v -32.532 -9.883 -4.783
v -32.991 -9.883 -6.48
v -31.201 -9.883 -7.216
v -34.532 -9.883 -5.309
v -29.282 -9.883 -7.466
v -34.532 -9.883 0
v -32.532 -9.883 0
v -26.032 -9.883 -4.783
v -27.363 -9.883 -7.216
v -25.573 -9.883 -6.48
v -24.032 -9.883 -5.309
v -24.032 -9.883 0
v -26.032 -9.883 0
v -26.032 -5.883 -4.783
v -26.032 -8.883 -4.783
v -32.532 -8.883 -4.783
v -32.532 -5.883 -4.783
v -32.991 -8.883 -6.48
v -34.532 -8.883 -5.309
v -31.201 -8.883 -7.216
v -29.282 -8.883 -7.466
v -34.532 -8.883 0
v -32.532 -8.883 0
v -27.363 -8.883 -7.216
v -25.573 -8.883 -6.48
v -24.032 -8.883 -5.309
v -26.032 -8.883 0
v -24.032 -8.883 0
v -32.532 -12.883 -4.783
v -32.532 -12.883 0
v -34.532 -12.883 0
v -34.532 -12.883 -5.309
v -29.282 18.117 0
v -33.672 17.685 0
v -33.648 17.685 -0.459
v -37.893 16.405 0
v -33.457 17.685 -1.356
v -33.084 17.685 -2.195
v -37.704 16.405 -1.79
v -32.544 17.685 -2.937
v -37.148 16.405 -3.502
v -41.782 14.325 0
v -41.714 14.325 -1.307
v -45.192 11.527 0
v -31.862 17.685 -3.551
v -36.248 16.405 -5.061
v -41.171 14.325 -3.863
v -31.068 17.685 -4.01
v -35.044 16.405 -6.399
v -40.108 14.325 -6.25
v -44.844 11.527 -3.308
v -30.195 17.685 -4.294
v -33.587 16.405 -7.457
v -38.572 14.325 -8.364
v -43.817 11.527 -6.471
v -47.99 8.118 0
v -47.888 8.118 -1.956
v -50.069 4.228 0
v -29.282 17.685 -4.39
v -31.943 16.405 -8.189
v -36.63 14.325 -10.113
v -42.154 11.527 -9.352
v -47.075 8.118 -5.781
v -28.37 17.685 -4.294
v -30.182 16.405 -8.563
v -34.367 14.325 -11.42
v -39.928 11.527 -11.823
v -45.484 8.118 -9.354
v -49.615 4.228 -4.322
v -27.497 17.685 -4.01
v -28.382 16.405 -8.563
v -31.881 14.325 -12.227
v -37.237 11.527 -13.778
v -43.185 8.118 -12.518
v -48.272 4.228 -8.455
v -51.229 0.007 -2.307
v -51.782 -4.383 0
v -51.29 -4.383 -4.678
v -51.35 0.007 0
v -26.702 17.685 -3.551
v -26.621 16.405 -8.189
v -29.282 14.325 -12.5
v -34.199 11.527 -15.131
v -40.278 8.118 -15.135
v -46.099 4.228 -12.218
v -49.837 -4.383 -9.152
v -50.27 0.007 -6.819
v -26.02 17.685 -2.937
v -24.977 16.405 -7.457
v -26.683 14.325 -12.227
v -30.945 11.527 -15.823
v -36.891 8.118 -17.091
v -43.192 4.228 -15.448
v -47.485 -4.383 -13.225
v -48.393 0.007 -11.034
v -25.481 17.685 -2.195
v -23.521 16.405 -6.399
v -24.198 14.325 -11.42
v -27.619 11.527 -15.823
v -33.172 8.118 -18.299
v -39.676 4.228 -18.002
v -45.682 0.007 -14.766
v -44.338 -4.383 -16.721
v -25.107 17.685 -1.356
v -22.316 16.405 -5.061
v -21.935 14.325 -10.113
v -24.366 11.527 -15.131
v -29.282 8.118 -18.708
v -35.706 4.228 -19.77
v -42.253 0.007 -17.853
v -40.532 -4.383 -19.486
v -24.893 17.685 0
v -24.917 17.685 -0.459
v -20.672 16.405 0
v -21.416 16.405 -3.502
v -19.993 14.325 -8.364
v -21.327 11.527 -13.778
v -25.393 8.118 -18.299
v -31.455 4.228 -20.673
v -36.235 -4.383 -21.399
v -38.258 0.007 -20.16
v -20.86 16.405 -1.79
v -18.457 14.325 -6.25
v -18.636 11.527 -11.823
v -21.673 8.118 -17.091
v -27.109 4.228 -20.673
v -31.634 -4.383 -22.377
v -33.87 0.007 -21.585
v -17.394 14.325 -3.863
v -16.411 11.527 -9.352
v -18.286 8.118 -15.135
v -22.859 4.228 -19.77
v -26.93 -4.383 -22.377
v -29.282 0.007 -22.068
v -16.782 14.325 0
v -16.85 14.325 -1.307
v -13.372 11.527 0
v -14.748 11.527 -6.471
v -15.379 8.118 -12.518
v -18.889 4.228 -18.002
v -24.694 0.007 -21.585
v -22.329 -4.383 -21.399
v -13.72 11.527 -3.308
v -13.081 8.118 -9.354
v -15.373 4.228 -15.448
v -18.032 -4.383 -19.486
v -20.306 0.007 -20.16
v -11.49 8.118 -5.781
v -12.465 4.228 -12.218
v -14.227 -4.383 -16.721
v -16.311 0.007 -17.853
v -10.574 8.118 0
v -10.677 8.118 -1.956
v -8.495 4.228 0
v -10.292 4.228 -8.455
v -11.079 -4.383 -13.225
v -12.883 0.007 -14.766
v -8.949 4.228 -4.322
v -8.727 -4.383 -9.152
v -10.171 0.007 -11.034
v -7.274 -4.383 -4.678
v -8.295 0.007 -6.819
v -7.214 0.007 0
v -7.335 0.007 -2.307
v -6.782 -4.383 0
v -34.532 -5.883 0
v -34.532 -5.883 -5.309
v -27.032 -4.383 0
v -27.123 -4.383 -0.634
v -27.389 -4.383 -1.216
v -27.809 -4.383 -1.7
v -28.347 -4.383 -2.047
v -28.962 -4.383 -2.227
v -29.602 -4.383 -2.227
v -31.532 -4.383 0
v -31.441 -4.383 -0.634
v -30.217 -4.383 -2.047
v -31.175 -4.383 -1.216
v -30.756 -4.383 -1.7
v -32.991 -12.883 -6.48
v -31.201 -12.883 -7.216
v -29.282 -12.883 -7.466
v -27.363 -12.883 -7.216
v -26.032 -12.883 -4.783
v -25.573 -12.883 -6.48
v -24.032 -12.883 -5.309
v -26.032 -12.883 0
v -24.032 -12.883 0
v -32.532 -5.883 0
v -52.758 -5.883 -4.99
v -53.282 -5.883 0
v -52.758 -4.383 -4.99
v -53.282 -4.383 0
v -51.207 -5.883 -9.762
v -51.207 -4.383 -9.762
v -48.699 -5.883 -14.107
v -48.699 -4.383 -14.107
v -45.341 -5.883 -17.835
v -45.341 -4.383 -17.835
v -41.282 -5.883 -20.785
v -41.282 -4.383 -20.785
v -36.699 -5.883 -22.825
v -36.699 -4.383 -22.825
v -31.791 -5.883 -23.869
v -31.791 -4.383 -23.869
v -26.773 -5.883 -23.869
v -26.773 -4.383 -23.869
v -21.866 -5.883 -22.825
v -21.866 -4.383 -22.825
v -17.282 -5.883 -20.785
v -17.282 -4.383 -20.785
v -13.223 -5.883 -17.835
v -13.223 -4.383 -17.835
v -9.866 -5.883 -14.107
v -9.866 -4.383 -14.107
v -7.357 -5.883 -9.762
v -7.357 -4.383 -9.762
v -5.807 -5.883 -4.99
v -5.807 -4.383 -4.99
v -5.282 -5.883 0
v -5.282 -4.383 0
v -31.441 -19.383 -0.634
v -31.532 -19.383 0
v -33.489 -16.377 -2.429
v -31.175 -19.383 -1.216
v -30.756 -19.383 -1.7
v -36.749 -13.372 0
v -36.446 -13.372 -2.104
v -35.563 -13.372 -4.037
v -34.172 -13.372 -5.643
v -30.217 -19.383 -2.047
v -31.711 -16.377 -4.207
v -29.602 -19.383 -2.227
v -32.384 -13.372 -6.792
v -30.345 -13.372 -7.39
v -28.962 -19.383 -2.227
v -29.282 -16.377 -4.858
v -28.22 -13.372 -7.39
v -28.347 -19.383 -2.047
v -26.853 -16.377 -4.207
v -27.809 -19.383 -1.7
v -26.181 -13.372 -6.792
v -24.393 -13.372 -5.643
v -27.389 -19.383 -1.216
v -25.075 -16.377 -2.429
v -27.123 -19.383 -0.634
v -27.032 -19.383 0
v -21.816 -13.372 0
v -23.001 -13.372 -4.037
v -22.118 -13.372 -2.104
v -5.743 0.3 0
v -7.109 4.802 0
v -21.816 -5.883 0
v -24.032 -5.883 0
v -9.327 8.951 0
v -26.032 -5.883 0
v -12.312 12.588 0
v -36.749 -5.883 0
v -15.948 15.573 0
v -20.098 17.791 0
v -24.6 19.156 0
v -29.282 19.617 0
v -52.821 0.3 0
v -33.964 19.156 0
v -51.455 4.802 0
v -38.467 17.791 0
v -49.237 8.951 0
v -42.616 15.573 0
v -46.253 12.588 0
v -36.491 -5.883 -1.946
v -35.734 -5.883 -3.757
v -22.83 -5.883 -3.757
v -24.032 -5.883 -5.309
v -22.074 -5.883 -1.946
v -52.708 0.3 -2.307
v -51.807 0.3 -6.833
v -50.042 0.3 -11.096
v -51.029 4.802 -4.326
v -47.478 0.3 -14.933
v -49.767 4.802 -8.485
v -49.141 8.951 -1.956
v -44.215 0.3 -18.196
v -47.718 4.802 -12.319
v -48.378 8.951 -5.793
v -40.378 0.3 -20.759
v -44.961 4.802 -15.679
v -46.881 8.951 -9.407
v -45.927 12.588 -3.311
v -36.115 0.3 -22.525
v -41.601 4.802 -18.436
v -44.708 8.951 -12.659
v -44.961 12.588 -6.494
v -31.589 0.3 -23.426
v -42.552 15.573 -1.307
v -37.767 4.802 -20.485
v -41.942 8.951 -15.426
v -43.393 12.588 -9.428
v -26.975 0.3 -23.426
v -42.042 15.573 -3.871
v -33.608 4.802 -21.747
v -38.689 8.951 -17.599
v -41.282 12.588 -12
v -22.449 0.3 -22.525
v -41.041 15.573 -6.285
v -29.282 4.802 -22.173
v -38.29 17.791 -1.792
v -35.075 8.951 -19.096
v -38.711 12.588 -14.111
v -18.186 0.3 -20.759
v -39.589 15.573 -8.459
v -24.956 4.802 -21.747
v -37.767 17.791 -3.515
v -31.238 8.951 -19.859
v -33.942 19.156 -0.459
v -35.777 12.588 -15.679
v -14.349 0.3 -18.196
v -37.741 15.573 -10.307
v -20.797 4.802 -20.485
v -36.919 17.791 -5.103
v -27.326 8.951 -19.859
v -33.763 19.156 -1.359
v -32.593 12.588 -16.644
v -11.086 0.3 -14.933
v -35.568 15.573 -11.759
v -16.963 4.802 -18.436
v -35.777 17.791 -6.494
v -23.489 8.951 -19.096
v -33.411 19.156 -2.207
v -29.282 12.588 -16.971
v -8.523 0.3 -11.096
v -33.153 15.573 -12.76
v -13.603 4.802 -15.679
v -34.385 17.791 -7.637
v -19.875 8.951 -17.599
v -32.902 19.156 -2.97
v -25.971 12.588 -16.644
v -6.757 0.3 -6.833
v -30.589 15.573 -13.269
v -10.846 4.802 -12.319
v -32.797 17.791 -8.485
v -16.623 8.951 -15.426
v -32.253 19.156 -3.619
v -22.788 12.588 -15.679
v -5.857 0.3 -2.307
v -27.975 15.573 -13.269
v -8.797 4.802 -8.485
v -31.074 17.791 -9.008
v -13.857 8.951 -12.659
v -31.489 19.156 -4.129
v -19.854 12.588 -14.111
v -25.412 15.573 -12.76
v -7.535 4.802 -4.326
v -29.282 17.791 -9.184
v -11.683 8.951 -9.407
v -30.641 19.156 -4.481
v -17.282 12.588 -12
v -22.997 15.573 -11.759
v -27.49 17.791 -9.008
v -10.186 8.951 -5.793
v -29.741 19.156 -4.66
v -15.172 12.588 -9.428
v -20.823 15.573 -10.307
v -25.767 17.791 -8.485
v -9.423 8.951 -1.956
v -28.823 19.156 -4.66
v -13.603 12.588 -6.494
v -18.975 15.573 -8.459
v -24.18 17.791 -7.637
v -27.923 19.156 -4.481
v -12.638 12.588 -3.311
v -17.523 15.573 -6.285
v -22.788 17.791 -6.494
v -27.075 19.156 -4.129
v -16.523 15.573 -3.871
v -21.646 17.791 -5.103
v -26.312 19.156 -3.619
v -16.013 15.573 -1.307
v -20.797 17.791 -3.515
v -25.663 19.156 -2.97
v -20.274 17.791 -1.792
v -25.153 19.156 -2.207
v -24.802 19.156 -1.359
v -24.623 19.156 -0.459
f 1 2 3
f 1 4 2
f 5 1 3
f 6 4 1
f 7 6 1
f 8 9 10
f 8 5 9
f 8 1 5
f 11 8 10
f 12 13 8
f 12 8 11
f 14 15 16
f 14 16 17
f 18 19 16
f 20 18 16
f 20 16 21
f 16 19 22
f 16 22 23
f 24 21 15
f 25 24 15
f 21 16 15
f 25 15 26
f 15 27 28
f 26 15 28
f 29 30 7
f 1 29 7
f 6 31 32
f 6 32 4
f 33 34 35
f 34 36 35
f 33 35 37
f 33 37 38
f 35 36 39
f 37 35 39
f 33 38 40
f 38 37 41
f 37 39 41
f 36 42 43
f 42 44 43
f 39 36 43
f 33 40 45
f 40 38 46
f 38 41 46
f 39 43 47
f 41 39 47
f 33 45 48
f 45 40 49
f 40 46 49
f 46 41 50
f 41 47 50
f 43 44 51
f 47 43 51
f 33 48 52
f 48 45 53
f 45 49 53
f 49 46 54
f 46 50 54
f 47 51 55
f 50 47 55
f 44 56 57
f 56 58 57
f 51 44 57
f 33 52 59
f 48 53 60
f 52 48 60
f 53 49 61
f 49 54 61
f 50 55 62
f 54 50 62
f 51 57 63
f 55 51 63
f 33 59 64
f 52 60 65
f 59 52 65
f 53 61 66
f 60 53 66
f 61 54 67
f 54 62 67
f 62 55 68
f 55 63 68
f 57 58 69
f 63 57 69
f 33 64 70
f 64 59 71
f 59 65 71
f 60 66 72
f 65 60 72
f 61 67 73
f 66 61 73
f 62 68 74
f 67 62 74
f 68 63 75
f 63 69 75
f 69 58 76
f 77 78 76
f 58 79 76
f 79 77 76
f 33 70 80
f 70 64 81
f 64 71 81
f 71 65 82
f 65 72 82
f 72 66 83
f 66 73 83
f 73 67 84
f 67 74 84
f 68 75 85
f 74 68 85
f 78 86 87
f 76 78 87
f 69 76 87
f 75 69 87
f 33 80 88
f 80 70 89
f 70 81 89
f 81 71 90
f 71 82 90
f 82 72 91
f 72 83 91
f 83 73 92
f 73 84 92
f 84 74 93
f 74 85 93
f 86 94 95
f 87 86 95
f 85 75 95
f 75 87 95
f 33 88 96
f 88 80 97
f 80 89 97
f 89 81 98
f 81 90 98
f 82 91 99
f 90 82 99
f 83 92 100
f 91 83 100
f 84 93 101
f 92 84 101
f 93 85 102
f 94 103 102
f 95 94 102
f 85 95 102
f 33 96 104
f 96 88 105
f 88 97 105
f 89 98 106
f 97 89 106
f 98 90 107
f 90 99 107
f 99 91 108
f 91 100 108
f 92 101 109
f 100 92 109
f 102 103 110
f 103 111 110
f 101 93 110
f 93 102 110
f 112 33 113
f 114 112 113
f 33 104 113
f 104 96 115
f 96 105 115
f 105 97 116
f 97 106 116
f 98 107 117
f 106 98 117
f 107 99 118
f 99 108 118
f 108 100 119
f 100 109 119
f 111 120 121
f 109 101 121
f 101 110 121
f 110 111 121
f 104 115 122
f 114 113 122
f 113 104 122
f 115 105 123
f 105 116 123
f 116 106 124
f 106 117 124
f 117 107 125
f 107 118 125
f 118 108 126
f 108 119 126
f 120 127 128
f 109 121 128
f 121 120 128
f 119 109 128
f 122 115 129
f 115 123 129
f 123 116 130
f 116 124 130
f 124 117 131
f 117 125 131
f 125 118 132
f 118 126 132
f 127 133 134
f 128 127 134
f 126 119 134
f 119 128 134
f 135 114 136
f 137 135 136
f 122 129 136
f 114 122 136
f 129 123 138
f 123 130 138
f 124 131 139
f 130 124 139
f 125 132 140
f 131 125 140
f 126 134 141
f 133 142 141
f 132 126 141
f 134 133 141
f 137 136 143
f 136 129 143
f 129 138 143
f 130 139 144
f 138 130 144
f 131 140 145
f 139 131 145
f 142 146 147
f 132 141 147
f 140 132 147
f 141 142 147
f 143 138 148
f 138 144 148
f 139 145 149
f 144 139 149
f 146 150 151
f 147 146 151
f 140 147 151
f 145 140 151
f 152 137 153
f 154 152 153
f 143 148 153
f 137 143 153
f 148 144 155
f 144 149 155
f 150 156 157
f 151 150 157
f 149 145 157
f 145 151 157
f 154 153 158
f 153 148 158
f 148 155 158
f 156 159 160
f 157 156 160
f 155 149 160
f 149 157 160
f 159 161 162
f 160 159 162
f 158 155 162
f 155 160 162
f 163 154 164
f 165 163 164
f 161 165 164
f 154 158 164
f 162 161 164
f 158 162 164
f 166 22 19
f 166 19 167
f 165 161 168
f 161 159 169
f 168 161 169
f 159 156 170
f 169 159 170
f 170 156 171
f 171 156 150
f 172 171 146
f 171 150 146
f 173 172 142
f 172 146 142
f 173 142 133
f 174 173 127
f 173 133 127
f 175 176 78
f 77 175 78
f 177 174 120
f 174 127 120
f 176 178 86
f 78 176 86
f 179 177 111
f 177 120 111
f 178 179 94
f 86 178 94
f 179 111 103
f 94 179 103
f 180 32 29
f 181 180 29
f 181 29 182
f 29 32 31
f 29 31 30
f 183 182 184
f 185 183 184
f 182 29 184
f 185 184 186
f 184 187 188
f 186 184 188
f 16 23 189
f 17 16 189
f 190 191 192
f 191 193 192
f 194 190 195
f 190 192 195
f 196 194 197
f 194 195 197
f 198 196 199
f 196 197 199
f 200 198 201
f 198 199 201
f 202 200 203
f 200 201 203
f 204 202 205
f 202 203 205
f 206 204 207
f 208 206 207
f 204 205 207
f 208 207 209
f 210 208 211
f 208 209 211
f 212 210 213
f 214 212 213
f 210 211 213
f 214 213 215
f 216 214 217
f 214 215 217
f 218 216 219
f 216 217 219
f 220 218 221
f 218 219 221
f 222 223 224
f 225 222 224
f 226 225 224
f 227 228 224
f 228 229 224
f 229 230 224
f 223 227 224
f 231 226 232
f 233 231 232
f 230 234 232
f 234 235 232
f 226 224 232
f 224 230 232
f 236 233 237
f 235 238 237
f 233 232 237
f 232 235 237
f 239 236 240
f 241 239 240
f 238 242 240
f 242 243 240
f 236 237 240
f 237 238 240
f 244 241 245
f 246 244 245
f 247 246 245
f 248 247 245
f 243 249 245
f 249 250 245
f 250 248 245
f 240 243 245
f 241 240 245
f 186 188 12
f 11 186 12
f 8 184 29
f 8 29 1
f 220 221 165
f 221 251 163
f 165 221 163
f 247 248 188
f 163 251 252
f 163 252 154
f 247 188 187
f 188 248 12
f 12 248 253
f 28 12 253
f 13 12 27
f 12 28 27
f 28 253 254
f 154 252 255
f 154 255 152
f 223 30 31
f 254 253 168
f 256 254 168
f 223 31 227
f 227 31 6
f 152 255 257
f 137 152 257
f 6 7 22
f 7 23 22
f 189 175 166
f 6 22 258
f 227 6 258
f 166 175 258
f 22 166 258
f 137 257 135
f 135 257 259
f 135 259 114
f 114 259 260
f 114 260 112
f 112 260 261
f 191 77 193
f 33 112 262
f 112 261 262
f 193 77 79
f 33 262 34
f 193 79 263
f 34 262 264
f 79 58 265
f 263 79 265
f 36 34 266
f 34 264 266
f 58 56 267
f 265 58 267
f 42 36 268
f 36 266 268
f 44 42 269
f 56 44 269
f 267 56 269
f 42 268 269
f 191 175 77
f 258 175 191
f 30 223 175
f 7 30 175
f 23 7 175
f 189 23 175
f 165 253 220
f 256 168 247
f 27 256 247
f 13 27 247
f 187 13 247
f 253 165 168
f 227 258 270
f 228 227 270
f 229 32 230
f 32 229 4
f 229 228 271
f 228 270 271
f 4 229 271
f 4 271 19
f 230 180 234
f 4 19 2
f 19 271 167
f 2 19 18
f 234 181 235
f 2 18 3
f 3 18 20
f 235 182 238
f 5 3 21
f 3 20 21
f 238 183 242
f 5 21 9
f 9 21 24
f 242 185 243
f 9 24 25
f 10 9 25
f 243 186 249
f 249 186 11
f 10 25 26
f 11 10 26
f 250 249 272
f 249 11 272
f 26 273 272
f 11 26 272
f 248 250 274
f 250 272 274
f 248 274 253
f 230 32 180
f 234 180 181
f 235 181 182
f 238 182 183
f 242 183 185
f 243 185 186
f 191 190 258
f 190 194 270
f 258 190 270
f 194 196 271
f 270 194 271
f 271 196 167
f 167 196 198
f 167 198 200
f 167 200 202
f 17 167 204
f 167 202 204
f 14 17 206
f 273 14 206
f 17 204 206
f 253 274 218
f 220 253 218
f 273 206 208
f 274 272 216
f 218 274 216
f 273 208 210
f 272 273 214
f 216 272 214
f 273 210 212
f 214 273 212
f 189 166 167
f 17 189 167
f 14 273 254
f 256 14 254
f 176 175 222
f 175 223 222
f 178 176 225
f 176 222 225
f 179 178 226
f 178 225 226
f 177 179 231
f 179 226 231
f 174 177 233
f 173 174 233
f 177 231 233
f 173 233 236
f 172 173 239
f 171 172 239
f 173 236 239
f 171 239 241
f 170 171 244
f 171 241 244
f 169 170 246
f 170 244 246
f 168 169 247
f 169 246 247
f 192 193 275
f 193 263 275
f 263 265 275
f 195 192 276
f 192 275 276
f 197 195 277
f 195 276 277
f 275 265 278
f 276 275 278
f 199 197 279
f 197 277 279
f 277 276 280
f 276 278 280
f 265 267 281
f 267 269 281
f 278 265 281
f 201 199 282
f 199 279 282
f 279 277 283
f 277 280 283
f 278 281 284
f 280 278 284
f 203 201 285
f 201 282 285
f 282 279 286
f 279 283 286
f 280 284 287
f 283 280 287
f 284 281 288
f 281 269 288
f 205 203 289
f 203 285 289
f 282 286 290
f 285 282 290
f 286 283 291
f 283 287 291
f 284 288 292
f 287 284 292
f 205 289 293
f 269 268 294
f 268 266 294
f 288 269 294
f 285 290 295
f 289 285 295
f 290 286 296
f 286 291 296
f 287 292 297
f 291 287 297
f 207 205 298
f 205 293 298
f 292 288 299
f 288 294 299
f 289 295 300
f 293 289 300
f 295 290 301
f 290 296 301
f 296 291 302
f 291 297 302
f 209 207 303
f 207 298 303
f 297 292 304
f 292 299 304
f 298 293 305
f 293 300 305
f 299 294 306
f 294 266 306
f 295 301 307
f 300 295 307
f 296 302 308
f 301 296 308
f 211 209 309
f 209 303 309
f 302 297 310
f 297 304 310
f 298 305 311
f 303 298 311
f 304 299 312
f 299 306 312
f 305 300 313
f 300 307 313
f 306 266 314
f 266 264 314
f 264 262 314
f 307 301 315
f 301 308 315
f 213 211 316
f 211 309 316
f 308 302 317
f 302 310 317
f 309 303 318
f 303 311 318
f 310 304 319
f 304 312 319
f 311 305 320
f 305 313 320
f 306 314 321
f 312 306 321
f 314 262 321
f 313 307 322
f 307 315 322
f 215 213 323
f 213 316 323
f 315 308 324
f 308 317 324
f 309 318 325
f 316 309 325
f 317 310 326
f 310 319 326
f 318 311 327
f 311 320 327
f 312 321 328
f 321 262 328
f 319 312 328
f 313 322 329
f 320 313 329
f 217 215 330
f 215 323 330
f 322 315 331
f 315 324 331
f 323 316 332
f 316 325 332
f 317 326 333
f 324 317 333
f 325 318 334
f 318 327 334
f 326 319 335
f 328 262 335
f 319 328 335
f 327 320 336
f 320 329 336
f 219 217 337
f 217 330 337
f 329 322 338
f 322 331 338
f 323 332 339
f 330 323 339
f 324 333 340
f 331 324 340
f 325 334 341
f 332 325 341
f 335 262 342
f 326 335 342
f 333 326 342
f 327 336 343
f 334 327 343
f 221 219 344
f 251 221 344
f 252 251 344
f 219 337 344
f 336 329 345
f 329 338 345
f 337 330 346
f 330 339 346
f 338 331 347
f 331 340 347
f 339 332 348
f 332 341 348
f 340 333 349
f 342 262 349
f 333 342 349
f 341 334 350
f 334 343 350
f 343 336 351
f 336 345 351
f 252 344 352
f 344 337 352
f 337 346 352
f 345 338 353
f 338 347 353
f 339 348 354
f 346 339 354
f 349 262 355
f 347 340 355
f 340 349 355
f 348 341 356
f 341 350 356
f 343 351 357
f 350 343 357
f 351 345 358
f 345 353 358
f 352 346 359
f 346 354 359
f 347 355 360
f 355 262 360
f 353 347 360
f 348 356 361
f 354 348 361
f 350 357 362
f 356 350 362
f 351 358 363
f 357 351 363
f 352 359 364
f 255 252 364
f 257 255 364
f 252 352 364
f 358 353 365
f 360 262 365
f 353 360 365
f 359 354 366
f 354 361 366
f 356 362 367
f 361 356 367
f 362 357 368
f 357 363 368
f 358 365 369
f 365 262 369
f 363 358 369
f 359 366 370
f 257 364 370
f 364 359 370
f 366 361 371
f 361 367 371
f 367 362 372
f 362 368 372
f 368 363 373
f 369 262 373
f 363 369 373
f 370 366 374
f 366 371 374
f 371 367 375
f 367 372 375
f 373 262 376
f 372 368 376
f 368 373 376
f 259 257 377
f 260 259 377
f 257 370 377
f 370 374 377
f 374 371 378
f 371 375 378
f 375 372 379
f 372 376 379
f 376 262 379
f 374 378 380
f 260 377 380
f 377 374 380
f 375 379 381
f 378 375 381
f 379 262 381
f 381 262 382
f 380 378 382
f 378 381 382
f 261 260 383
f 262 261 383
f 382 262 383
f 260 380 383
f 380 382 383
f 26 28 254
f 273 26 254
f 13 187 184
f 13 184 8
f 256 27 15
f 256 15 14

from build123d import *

# Parameters (mm, degrees)
REVOLUCI_N1_ANGLE     = 180
CROQUIS2_W            = 2
CROQUIS2_H            = 3
CORTAR_EXTRUIR1_DEPTH = 15
CROQUIS3_W            = 7.076217781
CROQUIS3_H            = 3
CROQUIS3_W_2          = 6.688868885
CORTAR_EXTRUIR2_DEPTH = 6.500003


with BuildPart() as part:
    # Croquis1 → Revolución1 (revolve)
    with BuildSketch(Plane.XY):
        with BuildLine():
            Line((-51.782166939, -4.382597623), (-31.532166939, -4.382597623))
            Line((-31.532166939, -4.382597623), (-31.532166939, -14.382597623))
            Line((-31.532166939, -14.382597623), (-31.532166939, -19.382597623))
            Line((-31.532166939, -19.382597623), (-36.748543174, -13.37211471))
            Line((-36.748543174, -13.37211471), (-36.748543174, -5.882597623))
            Line((-36.748543174, -5.882597623), (-43.248543174, -5.882597623))
            Line((-43.248543174, -5.882597623), (-53.282166939, -5.882597623))
            Line((-53.282166939, -5.882597623), (-53.282166939, -4.382597623))
            ThreePointArc((-53.282166939, -4.382597623), (-46.252729688, 12.587965125), (-29.282166939, 19.617402377))
            Line((-29.282166939, 19.617402377), (-29.282166939, 18.117402377))
            ThreePointArc((-29.282166939, 18.117402377), (-45.192069516, 11.527304954), (-51.782166939, -4.382597623))
        make_face()
    revolve(axis=Axis((-29.282166939, 19.617402377, 0), (0, -1, 0)), revolution_arc=REVOLUCI_N1_ANGLE)

    # Croquis2 → Cortar-Extruir1 (cut)
    with BuildSketch(Plane.XY):
        with Locations((-33.532166939, -7.382597623)):
            Rectangle(CROQUIS2_W, CROQUIS2_H)
        with Locations((-25.032166939, -7.382597623)):
            Rectangle(CROQUIS2_W, CROQUIS2_H)
        with Locations((-25.032166939, -11.382597623)):
            Rectangle(CROQUIS2_W, CROQUIS2_H)
        with Locations((-33.532166939, -11.382597623)):
            Rectangle(CROQUIS2_W, CROQUIS2_H)
    extrude(amount=-CORTAR_EXTRUIR1_DEPTH, mode=Mode.SUBTRACT)

    # Croquis3 → Cortar-Extruir2 (cut)
    with BuildSketch(Plane(origin=(-26.032166939, 0, 0), x_dir=(0, 0, -1), z_dir=(1, 0, 0))):
        with Locations((8.321249271, -11.382597623)):
            Rectangle(CROQUIS3_W, CROQUIS3_H)
        with Locations((8.127574822, -7.382597623)):
            Rectangle(CROQUIS3_W_2, CROQUIS3_H)
    extrude(amount=-CORTAR_EXTRUIR2_DEPTH, mode=Mode.SUBTRACT)


solid = part.part
